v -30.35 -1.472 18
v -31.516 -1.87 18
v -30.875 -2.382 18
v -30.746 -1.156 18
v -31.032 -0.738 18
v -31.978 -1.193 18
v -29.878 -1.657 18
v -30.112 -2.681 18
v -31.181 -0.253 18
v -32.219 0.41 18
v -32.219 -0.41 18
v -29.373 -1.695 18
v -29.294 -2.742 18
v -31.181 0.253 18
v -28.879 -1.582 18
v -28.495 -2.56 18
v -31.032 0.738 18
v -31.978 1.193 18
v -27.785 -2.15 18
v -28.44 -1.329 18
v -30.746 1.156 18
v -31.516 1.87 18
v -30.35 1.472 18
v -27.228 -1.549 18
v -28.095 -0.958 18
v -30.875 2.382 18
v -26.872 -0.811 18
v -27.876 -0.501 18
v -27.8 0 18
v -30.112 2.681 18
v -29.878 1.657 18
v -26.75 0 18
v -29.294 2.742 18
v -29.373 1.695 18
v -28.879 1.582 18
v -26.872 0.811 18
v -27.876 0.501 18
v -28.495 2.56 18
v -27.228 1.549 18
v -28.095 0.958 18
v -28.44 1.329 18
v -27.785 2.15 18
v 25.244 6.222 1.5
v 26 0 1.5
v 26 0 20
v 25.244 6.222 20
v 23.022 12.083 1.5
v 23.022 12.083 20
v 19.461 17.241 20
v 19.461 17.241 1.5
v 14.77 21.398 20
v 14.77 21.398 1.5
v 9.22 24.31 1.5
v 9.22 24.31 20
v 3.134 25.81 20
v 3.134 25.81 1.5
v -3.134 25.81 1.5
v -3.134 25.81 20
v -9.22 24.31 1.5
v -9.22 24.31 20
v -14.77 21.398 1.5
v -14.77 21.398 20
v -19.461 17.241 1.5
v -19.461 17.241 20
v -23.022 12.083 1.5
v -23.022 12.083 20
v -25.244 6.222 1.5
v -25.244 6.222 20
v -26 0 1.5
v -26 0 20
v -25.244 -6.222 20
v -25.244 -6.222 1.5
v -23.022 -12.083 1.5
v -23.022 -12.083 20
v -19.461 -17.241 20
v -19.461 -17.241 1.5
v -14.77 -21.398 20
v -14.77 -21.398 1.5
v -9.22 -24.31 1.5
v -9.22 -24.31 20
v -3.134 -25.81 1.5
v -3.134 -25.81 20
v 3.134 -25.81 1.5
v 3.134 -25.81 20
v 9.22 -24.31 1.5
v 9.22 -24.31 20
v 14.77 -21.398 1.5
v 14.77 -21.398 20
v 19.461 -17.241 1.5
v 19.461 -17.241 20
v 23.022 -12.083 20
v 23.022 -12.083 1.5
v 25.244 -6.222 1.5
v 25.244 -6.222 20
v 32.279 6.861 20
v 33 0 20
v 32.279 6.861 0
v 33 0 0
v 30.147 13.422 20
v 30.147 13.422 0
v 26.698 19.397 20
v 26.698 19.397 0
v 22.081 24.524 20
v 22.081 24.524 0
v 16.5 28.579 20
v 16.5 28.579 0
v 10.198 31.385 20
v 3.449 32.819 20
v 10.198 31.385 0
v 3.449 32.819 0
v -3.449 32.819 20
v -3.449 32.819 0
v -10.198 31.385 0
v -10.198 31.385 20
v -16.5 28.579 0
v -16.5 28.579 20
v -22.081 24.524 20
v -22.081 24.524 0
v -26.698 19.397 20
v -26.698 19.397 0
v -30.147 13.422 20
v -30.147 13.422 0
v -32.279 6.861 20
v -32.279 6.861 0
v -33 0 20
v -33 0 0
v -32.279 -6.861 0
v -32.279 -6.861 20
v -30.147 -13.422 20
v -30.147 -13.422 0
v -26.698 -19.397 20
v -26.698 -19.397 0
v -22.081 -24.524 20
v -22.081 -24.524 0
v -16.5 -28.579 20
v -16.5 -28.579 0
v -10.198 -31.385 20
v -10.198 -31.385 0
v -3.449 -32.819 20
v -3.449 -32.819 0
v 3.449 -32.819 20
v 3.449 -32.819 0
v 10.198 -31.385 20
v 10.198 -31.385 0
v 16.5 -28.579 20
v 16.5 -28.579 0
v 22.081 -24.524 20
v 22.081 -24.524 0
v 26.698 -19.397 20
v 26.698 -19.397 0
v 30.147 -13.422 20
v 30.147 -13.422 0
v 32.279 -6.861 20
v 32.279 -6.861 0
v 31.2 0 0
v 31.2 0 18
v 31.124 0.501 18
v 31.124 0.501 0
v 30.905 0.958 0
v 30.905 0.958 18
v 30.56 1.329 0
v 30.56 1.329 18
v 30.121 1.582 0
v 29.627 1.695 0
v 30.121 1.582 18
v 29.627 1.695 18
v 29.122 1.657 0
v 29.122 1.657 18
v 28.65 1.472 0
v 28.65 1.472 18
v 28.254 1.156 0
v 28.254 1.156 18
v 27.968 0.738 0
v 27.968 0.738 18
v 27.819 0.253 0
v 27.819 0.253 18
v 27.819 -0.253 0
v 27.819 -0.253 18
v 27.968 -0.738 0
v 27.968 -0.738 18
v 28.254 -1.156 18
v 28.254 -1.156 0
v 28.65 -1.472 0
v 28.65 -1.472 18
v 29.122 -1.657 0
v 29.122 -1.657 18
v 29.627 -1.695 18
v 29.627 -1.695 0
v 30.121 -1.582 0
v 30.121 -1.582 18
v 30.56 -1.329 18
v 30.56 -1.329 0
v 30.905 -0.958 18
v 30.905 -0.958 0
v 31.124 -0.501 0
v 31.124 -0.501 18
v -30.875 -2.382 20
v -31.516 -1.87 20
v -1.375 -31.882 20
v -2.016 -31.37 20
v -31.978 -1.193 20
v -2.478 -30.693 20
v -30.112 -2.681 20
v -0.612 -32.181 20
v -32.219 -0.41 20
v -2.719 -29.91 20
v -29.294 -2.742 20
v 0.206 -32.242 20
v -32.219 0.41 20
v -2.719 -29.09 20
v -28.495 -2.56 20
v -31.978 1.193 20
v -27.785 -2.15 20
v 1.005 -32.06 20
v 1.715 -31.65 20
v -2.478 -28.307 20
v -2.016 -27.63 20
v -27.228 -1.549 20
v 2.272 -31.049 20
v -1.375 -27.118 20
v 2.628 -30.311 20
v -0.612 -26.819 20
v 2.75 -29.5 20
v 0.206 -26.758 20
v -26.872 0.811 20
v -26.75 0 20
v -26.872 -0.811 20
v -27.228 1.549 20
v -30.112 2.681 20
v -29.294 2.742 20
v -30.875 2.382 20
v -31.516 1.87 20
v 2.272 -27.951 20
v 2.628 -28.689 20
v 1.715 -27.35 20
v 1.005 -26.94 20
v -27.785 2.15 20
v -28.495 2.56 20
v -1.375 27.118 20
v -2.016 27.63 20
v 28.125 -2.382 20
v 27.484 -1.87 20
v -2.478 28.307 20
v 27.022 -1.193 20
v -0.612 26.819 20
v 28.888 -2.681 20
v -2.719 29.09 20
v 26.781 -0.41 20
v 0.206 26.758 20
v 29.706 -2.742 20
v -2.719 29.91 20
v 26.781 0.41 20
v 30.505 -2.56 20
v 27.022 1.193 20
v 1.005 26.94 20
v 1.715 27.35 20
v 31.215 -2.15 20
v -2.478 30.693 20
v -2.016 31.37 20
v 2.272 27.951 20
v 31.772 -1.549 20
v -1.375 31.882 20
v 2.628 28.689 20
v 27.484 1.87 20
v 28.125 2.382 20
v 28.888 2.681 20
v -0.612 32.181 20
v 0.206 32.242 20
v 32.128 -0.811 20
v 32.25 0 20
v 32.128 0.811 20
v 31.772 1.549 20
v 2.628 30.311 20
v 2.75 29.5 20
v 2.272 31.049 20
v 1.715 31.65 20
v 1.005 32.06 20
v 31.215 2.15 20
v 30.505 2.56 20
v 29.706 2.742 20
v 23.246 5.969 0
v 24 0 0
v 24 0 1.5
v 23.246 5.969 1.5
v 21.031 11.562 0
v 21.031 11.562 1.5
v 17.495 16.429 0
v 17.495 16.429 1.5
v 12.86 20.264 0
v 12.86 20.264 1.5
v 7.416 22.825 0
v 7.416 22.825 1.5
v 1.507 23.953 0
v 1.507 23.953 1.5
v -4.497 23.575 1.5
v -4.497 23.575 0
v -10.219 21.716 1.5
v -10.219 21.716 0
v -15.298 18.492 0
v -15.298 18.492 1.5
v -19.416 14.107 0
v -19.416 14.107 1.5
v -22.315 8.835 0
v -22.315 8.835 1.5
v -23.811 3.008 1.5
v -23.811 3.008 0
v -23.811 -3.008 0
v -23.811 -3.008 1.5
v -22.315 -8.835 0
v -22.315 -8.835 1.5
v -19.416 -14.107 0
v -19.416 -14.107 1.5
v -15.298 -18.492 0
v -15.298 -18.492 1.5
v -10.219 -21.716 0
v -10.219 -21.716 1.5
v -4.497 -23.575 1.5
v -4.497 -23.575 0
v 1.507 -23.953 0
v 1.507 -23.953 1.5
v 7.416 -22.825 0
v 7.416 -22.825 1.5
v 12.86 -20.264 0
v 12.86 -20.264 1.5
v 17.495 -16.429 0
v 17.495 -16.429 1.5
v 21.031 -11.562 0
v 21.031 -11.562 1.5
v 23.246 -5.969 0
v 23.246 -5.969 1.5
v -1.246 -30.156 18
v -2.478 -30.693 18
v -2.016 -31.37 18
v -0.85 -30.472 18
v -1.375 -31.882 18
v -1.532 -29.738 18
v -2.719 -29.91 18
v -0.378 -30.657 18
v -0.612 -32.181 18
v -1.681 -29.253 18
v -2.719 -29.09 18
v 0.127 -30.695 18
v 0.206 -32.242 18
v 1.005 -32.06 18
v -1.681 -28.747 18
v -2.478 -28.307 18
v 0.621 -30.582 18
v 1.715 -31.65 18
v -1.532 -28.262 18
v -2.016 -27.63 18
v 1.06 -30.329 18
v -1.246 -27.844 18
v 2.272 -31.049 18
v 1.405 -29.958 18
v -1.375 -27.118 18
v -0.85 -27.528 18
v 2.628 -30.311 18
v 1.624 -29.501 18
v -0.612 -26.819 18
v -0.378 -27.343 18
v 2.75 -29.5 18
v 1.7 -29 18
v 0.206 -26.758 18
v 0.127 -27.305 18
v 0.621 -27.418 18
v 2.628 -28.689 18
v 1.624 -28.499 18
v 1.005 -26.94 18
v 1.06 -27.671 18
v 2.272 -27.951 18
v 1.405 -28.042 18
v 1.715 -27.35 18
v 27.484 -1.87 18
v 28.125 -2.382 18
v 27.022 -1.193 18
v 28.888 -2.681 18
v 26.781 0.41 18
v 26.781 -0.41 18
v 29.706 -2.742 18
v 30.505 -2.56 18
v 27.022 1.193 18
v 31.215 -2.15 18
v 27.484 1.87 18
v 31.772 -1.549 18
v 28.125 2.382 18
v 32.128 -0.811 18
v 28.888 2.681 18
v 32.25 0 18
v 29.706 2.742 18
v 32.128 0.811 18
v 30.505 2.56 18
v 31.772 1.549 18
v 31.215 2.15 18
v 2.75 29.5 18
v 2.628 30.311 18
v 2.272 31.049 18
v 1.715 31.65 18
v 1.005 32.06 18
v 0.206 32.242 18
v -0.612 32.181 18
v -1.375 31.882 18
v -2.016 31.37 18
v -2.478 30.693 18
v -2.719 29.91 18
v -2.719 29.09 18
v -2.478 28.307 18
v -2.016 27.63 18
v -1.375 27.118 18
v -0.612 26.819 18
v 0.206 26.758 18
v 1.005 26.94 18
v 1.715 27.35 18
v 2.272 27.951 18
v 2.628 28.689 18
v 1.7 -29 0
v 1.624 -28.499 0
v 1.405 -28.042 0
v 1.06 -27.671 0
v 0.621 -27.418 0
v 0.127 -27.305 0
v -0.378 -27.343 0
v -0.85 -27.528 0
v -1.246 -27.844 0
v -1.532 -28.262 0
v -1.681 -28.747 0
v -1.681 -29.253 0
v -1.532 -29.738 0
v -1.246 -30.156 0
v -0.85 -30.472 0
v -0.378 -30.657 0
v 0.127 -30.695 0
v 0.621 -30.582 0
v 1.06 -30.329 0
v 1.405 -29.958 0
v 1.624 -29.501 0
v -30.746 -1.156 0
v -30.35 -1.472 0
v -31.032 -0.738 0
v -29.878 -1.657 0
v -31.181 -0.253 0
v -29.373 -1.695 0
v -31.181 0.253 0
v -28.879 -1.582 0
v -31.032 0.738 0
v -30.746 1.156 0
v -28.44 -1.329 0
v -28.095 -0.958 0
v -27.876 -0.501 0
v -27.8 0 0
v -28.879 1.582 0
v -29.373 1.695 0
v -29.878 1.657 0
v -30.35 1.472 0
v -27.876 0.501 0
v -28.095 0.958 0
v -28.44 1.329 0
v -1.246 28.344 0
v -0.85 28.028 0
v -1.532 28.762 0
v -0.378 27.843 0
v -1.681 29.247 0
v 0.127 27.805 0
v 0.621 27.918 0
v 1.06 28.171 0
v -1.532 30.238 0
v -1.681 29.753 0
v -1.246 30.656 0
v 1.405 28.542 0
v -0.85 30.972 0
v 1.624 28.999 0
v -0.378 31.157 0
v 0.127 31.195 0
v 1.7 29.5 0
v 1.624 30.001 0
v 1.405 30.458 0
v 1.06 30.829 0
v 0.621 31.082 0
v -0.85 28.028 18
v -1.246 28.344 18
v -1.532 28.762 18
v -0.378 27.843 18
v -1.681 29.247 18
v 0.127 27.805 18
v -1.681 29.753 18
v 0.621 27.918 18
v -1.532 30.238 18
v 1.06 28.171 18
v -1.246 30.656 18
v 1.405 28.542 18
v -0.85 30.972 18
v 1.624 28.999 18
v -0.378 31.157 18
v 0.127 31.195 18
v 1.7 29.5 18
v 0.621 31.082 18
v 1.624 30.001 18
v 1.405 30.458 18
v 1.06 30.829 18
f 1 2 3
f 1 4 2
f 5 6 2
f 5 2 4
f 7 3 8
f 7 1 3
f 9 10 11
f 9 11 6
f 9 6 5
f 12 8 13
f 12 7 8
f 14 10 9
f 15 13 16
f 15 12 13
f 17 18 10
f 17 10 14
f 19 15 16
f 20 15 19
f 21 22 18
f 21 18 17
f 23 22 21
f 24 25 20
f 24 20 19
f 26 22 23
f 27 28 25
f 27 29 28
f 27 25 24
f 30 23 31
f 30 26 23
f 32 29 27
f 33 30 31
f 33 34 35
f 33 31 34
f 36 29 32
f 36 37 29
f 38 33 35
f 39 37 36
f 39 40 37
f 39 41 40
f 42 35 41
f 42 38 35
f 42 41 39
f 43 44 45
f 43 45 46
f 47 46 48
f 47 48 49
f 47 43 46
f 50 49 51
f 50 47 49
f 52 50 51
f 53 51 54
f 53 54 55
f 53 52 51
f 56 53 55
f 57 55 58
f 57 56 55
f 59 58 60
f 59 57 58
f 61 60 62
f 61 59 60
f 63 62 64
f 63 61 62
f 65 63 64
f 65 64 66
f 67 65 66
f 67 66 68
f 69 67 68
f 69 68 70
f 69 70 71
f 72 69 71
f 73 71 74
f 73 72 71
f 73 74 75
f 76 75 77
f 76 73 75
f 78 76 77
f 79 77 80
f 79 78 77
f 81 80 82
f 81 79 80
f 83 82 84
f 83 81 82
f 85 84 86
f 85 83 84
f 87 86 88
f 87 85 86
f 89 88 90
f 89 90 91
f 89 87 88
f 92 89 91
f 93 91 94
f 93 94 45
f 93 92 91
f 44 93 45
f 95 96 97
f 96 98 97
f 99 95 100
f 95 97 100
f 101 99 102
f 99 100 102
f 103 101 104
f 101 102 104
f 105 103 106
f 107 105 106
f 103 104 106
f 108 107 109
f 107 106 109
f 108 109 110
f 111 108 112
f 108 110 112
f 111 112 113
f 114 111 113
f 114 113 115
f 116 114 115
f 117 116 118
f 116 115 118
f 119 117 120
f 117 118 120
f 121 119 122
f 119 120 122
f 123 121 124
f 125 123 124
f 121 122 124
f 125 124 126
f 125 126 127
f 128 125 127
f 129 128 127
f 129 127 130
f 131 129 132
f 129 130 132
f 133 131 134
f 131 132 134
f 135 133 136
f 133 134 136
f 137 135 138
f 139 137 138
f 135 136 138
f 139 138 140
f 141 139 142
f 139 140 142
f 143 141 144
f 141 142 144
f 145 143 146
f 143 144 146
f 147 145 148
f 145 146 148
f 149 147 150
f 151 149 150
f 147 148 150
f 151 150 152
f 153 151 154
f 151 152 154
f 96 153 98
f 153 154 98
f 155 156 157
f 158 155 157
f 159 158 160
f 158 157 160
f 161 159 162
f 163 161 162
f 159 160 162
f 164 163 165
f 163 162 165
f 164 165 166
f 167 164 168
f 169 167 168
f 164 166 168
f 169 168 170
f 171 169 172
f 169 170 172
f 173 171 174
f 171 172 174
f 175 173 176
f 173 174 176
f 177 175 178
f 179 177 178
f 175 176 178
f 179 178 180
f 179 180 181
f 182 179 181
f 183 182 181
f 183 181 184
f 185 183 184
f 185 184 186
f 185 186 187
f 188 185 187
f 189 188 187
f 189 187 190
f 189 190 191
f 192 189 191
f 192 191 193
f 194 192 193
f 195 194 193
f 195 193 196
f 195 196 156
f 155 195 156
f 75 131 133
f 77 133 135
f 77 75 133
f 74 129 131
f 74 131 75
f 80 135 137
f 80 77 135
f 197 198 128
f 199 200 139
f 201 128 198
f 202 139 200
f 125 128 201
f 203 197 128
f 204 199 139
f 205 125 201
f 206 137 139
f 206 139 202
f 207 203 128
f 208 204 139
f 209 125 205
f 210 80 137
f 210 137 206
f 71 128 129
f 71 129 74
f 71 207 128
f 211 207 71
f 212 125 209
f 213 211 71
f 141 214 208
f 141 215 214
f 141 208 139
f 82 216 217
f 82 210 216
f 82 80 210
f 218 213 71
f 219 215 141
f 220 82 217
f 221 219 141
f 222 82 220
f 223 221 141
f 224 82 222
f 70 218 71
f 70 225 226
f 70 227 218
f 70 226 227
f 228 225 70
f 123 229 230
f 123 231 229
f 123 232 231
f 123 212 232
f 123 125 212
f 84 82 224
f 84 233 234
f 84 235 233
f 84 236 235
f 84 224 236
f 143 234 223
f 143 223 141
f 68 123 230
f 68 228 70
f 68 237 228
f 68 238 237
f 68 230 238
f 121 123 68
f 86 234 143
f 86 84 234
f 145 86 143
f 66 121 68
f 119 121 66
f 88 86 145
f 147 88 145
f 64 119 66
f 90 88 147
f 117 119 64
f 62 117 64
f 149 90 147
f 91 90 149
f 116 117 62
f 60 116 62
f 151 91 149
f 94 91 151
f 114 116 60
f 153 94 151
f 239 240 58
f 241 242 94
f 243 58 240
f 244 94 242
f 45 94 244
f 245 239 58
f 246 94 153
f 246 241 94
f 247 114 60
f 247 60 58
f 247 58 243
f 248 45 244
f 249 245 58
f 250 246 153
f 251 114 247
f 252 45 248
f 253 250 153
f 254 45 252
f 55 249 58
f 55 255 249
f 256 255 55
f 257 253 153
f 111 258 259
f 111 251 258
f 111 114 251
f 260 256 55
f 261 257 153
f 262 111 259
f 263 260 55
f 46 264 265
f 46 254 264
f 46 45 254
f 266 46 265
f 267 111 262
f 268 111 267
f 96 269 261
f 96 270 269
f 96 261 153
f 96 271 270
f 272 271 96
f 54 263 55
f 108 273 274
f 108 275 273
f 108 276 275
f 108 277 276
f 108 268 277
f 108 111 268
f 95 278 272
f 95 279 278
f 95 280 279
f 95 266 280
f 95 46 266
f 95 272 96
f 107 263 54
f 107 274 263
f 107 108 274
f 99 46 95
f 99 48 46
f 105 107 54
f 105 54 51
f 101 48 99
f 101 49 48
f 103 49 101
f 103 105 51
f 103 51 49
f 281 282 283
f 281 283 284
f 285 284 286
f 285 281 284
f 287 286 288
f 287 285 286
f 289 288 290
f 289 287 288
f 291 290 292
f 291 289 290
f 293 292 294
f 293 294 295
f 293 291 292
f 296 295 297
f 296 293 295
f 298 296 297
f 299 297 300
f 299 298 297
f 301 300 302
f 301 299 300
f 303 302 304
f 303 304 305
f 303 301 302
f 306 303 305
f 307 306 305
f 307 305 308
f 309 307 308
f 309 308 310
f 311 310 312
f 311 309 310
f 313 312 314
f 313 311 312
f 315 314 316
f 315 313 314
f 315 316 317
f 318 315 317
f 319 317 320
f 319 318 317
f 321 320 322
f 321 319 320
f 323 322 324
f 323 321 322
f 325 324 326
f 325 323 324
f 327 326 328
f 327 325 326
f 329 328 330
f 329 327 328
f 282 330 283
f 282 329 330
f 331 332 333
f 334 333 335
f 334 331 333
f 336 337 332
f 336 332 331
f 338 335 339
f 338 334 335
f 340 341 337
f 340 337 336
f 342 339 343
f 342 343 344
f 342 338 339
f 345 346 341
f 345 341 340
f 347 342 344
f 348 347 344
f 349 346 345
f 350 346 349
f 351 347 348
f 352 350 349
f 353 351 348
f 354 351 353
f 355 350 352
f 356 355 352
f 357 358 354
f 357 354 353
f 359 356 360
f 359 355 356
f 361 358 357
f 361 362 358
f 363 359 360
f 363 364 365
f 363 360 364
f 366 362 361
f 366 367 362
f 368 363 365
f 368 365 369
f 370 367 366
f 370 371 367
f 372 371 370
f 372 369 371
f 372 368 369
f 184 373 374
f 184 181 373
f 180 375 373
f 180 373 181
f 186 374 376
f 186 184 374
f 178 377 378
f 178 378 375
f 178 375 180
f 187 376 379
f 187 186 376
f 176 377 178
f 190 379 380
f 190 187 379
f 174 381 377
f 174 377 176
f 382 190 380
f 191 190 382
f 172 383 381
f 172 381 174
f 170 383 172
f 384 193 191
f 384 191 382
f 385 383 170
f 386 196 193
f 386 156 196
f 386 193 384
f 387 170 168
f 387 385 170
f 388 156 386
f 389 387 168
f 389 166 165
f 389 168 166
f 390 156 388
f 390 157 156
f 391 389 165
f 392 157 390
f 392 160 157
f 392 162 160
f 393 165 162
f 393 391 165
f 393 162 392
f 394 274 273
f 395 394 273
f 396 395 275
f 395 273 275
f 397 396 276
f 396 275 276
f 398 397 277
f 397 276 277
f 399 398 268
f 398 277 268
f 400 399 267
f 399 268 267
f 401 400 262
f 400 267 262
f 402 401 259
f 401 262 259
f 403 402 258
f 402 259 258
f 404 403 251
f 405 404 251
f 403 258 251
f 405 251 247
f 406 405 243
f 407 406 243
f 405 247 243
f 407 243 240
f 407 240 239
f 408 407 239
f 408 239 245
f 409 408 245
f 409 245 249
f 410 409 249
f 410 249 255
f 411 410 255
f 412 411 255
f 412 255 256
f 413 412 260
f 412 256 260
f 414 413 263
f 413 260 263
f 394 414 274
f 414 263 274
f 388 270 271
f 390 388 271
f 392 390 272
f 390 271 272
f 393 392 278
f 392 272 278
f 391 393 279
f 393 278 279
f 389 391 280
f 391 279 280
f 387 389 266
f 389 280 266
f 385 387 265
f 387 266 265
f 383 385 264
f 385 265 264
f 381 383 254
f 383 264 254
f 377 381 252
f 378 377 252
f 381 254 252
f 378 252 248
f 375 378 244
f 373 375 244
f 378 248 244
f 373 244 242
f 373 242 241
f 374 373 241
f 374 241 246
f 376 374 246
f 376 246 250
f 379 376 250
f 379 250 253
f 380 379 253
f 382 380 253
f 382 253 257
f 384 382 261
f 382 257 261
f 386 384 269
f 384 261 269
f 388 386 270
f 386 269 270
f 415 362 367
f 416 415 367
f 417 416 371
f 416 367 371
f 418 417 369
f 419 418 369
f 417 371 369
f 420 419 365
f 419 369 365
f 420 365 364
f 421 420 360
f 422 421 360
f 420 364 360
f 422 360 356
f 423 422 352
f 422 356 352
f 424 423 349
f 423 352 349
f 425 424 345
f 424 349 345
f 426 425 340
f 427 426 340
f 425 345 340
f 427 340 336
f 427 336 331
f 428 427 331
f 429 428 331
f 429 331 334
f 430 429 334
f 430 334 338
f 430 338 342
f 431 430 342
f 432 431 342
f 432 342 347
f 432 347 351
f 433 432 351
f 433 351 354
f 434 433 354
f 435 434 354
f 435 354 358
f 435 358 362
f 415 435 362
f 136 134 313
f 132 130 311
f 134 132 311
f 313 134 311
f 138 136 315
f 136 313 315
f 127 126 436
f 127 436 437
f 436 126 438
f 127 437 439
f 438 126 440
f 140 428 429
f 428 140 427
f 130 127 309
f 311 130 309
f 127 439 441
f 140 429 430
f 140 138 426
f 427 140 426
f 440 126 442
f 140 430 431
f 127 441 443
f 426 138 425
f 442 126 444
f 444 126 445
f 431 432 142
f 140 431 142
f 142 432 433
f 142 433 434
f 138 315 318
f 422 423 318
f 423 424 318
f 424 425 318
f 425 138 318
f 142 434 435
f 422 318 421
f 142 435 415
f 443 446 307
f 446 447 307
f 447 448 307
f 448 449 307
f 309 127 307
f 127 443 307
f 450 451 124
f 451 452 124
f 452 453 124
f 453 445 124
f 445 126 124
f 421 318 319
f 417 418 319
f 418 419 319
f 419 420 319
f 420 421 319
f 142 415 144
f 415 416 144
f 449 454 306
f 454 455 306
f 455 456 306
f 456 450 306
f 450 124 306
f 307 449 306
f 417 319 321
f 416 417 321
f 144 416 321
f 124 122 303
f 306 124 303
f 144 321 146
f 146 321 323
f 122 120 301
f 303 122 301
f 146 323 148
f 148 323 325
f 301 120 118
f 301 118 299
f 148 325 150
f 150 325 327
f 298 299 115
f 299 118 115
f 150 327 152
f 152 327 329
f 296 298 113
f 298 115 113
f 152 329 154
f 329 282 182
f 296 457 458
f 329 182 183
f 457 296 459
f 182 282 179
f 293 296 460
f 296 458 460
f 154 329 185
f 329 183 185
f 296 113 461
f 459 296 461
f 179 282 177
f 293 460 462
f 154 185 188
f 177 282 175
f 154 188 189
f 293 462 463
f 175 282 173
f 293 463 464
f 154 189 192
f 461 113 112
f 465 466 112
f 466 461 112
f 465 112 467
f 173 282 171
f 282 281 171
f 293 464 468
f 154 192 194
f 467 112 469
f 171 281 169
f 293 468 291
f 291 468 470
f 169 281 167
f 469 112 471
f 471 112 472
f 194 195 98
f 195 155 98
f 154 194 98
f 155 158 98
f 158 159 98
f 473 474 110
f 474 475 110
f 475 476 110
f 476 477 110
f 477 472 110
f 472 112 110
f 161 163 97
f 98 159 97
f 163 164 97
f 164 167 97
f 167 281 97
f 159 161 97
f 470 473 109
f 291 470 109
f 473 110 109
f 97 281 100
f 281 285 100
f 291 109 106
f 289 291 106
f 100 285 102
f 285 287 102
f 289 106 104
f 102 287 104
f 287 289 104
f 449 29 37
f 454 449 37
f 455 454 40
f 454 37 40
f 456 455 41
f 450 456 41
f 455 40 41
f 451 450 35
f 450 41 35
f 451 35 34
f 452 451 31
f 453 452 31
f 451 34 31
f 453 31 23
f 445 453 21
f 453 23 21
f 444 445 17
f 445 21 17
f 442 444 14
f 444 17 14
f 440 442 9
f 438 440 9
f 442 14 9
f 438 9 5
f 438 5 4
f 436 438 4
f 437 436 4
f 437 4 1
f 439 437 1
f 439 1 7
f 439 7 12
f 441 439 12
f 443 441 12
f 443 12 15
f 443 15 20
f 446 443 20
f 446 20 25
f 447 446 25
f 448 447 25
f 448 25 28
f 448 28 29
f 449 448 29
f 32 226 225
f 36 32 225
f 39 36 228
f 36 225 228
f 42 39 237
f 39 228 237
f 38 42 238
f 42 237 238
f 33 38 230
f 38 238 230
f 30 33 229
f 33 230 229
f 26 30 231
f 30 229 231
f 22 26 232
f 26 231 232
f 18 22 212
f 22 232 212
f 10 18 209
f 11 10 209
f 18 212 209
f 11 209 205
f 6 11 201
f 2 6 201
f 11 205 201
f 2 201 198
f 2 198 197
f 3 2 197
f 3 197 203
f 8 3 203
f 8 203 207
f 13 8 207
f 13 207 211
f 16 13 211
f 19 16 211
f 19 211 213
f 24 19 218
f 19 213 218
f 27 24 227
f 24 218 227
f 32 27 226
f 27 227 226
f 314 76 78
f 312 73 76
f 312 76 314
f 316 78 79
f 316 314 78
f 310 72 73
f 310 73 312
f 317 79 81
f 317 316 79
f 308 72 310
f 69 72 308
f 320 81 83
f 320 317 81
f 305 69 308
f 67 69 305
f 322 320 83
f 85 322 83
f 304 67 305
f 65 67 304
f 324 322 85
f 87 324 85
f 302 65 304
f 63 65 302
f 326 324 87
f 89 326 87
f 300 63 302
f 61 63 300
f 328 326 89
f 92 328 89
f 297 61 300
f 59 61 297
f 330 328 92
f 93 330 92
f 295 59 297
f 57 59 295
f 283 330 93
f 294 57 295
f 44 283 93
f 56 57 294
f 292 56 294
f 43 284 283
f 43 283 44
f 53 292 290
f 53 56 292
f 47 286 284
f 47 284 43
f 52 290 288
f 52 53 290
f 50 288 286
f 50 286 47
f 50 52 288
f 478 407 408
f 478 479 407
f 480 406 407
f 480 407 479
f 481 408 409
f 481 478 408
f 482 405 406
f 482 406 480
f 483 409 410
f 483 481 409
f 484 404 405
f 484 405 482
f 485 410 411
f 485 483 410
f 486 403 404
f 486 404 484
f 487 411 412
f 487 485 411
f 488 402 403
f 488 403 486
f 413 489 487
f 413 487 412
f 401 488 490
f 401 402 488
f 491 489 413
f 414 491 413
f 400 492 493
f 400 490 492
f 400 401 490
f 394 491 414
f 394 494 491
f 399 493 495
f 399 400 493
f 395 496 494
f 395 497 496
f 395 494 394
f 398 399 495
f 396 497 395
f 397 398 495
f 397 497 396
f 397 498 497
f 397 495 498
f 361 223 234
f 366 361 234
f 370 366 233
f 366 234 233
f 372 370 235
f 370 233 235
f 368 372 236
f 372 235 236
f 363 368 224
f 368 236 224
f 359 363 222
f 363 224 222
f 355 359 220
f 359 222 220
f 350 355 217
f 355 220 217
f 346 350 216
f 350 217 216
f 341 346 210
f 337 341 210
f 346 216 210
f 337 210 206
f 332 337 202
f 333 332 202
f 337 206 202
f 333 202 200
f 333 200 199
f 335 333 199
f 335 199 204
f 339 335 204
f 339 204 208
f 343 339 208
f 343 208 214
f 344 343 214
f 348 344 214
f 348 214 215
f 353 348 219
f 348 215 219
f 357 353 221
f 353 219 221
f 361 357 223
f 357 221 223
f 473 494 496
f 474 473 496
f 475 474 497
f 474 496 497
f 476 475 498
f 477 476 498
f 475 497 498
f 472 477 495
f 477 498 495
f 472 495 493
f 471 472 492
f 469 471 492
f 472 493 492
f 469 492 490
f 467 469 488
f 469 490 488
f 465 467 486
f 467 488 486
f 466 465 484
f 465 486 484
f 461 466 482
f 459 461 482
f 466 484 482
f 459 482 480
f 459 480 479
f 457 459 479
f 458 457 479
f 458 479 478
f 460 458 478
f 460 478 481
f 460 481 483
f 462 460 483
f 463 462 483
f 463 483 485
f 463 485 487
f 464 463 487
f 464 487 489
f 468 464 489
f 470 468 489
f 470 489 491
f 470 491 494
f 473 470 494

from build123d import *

# Parameters (mm, degrees)
SKETCH1_R           = 33
SKETCH1_R_2         = 24
BOSS_EXTRUDE1_DEPTH = 1.5
SKETCH3_R           = 33
SKETCH3_R_2         = 26
BOSS_EXTRUDE2_DEPTH = 18.5
SKETCH4_R           = 1.7
CUT_EXTRUDE1_DEPTH  = 51.774009099
SKETCH5_R           = 2.75
CUT_EXTRUDE2_DEPTH  = 2


with BuildPart() as part:
    # Sketch1 → Boss-Extrude1 (new body)
    with BuildSketch(Plane.XY):
        Circle(SKETCH1_R)
        Circle(SKETCH1_R_2, mode=Mode.SUBTRACT)
    extrude(amount=BOSS_EXTRUDE1_DEPTH)

    # Sketch3 → Boss-Extrude2 (add)
    with BuildSketch(Plane.XY.offset(1.5)):
        Circle(SKETCH3_R)
        Circle(SKETCH3_R_2, mode=Mode.SUBTRACT)
    extrude(amount=BOSS_EXTRUDE2_DEPTH)

    # Sketch4 → Cut-Extrude1 (cut, through all)
    with BuildSketch(Plane.XY.offset(20)):
        with Locations((0, 29.5)):
            Circle(SKETCH4_R)
        with Locations((29.5, 0)):
            Circle(SKETCH4_R)
        with Locations((0, -29)):
            Circle(SKETCH4_R)
        with Locations((-29.5, 0)):
            Circle(SKETCH4_R)
    extrude(amount=-CUT_EXTRUDE1_DEPTH, mode=Mode.SUBTRACT)

    # Sketch5 → Cut-Extrude2 (cut)
    with BuildSketch(Plane.XY.offset(20)):
        with Locations((0, 29.5)):
            Circle(SKETCH5_R)
        with Locations((29.5, 0)):
            Circle(SKETCH5_R)
        with Locations((0, -29.5)):
            Circle(SKETCH5_R)
        with Locations((-29.5, 0)):
            Circle(SKETCH5_R)
    extrude(amount=-CUT_EXTRUDE2_DEPTH, mode=Mode.SUBTRACT)


solid = part.part
